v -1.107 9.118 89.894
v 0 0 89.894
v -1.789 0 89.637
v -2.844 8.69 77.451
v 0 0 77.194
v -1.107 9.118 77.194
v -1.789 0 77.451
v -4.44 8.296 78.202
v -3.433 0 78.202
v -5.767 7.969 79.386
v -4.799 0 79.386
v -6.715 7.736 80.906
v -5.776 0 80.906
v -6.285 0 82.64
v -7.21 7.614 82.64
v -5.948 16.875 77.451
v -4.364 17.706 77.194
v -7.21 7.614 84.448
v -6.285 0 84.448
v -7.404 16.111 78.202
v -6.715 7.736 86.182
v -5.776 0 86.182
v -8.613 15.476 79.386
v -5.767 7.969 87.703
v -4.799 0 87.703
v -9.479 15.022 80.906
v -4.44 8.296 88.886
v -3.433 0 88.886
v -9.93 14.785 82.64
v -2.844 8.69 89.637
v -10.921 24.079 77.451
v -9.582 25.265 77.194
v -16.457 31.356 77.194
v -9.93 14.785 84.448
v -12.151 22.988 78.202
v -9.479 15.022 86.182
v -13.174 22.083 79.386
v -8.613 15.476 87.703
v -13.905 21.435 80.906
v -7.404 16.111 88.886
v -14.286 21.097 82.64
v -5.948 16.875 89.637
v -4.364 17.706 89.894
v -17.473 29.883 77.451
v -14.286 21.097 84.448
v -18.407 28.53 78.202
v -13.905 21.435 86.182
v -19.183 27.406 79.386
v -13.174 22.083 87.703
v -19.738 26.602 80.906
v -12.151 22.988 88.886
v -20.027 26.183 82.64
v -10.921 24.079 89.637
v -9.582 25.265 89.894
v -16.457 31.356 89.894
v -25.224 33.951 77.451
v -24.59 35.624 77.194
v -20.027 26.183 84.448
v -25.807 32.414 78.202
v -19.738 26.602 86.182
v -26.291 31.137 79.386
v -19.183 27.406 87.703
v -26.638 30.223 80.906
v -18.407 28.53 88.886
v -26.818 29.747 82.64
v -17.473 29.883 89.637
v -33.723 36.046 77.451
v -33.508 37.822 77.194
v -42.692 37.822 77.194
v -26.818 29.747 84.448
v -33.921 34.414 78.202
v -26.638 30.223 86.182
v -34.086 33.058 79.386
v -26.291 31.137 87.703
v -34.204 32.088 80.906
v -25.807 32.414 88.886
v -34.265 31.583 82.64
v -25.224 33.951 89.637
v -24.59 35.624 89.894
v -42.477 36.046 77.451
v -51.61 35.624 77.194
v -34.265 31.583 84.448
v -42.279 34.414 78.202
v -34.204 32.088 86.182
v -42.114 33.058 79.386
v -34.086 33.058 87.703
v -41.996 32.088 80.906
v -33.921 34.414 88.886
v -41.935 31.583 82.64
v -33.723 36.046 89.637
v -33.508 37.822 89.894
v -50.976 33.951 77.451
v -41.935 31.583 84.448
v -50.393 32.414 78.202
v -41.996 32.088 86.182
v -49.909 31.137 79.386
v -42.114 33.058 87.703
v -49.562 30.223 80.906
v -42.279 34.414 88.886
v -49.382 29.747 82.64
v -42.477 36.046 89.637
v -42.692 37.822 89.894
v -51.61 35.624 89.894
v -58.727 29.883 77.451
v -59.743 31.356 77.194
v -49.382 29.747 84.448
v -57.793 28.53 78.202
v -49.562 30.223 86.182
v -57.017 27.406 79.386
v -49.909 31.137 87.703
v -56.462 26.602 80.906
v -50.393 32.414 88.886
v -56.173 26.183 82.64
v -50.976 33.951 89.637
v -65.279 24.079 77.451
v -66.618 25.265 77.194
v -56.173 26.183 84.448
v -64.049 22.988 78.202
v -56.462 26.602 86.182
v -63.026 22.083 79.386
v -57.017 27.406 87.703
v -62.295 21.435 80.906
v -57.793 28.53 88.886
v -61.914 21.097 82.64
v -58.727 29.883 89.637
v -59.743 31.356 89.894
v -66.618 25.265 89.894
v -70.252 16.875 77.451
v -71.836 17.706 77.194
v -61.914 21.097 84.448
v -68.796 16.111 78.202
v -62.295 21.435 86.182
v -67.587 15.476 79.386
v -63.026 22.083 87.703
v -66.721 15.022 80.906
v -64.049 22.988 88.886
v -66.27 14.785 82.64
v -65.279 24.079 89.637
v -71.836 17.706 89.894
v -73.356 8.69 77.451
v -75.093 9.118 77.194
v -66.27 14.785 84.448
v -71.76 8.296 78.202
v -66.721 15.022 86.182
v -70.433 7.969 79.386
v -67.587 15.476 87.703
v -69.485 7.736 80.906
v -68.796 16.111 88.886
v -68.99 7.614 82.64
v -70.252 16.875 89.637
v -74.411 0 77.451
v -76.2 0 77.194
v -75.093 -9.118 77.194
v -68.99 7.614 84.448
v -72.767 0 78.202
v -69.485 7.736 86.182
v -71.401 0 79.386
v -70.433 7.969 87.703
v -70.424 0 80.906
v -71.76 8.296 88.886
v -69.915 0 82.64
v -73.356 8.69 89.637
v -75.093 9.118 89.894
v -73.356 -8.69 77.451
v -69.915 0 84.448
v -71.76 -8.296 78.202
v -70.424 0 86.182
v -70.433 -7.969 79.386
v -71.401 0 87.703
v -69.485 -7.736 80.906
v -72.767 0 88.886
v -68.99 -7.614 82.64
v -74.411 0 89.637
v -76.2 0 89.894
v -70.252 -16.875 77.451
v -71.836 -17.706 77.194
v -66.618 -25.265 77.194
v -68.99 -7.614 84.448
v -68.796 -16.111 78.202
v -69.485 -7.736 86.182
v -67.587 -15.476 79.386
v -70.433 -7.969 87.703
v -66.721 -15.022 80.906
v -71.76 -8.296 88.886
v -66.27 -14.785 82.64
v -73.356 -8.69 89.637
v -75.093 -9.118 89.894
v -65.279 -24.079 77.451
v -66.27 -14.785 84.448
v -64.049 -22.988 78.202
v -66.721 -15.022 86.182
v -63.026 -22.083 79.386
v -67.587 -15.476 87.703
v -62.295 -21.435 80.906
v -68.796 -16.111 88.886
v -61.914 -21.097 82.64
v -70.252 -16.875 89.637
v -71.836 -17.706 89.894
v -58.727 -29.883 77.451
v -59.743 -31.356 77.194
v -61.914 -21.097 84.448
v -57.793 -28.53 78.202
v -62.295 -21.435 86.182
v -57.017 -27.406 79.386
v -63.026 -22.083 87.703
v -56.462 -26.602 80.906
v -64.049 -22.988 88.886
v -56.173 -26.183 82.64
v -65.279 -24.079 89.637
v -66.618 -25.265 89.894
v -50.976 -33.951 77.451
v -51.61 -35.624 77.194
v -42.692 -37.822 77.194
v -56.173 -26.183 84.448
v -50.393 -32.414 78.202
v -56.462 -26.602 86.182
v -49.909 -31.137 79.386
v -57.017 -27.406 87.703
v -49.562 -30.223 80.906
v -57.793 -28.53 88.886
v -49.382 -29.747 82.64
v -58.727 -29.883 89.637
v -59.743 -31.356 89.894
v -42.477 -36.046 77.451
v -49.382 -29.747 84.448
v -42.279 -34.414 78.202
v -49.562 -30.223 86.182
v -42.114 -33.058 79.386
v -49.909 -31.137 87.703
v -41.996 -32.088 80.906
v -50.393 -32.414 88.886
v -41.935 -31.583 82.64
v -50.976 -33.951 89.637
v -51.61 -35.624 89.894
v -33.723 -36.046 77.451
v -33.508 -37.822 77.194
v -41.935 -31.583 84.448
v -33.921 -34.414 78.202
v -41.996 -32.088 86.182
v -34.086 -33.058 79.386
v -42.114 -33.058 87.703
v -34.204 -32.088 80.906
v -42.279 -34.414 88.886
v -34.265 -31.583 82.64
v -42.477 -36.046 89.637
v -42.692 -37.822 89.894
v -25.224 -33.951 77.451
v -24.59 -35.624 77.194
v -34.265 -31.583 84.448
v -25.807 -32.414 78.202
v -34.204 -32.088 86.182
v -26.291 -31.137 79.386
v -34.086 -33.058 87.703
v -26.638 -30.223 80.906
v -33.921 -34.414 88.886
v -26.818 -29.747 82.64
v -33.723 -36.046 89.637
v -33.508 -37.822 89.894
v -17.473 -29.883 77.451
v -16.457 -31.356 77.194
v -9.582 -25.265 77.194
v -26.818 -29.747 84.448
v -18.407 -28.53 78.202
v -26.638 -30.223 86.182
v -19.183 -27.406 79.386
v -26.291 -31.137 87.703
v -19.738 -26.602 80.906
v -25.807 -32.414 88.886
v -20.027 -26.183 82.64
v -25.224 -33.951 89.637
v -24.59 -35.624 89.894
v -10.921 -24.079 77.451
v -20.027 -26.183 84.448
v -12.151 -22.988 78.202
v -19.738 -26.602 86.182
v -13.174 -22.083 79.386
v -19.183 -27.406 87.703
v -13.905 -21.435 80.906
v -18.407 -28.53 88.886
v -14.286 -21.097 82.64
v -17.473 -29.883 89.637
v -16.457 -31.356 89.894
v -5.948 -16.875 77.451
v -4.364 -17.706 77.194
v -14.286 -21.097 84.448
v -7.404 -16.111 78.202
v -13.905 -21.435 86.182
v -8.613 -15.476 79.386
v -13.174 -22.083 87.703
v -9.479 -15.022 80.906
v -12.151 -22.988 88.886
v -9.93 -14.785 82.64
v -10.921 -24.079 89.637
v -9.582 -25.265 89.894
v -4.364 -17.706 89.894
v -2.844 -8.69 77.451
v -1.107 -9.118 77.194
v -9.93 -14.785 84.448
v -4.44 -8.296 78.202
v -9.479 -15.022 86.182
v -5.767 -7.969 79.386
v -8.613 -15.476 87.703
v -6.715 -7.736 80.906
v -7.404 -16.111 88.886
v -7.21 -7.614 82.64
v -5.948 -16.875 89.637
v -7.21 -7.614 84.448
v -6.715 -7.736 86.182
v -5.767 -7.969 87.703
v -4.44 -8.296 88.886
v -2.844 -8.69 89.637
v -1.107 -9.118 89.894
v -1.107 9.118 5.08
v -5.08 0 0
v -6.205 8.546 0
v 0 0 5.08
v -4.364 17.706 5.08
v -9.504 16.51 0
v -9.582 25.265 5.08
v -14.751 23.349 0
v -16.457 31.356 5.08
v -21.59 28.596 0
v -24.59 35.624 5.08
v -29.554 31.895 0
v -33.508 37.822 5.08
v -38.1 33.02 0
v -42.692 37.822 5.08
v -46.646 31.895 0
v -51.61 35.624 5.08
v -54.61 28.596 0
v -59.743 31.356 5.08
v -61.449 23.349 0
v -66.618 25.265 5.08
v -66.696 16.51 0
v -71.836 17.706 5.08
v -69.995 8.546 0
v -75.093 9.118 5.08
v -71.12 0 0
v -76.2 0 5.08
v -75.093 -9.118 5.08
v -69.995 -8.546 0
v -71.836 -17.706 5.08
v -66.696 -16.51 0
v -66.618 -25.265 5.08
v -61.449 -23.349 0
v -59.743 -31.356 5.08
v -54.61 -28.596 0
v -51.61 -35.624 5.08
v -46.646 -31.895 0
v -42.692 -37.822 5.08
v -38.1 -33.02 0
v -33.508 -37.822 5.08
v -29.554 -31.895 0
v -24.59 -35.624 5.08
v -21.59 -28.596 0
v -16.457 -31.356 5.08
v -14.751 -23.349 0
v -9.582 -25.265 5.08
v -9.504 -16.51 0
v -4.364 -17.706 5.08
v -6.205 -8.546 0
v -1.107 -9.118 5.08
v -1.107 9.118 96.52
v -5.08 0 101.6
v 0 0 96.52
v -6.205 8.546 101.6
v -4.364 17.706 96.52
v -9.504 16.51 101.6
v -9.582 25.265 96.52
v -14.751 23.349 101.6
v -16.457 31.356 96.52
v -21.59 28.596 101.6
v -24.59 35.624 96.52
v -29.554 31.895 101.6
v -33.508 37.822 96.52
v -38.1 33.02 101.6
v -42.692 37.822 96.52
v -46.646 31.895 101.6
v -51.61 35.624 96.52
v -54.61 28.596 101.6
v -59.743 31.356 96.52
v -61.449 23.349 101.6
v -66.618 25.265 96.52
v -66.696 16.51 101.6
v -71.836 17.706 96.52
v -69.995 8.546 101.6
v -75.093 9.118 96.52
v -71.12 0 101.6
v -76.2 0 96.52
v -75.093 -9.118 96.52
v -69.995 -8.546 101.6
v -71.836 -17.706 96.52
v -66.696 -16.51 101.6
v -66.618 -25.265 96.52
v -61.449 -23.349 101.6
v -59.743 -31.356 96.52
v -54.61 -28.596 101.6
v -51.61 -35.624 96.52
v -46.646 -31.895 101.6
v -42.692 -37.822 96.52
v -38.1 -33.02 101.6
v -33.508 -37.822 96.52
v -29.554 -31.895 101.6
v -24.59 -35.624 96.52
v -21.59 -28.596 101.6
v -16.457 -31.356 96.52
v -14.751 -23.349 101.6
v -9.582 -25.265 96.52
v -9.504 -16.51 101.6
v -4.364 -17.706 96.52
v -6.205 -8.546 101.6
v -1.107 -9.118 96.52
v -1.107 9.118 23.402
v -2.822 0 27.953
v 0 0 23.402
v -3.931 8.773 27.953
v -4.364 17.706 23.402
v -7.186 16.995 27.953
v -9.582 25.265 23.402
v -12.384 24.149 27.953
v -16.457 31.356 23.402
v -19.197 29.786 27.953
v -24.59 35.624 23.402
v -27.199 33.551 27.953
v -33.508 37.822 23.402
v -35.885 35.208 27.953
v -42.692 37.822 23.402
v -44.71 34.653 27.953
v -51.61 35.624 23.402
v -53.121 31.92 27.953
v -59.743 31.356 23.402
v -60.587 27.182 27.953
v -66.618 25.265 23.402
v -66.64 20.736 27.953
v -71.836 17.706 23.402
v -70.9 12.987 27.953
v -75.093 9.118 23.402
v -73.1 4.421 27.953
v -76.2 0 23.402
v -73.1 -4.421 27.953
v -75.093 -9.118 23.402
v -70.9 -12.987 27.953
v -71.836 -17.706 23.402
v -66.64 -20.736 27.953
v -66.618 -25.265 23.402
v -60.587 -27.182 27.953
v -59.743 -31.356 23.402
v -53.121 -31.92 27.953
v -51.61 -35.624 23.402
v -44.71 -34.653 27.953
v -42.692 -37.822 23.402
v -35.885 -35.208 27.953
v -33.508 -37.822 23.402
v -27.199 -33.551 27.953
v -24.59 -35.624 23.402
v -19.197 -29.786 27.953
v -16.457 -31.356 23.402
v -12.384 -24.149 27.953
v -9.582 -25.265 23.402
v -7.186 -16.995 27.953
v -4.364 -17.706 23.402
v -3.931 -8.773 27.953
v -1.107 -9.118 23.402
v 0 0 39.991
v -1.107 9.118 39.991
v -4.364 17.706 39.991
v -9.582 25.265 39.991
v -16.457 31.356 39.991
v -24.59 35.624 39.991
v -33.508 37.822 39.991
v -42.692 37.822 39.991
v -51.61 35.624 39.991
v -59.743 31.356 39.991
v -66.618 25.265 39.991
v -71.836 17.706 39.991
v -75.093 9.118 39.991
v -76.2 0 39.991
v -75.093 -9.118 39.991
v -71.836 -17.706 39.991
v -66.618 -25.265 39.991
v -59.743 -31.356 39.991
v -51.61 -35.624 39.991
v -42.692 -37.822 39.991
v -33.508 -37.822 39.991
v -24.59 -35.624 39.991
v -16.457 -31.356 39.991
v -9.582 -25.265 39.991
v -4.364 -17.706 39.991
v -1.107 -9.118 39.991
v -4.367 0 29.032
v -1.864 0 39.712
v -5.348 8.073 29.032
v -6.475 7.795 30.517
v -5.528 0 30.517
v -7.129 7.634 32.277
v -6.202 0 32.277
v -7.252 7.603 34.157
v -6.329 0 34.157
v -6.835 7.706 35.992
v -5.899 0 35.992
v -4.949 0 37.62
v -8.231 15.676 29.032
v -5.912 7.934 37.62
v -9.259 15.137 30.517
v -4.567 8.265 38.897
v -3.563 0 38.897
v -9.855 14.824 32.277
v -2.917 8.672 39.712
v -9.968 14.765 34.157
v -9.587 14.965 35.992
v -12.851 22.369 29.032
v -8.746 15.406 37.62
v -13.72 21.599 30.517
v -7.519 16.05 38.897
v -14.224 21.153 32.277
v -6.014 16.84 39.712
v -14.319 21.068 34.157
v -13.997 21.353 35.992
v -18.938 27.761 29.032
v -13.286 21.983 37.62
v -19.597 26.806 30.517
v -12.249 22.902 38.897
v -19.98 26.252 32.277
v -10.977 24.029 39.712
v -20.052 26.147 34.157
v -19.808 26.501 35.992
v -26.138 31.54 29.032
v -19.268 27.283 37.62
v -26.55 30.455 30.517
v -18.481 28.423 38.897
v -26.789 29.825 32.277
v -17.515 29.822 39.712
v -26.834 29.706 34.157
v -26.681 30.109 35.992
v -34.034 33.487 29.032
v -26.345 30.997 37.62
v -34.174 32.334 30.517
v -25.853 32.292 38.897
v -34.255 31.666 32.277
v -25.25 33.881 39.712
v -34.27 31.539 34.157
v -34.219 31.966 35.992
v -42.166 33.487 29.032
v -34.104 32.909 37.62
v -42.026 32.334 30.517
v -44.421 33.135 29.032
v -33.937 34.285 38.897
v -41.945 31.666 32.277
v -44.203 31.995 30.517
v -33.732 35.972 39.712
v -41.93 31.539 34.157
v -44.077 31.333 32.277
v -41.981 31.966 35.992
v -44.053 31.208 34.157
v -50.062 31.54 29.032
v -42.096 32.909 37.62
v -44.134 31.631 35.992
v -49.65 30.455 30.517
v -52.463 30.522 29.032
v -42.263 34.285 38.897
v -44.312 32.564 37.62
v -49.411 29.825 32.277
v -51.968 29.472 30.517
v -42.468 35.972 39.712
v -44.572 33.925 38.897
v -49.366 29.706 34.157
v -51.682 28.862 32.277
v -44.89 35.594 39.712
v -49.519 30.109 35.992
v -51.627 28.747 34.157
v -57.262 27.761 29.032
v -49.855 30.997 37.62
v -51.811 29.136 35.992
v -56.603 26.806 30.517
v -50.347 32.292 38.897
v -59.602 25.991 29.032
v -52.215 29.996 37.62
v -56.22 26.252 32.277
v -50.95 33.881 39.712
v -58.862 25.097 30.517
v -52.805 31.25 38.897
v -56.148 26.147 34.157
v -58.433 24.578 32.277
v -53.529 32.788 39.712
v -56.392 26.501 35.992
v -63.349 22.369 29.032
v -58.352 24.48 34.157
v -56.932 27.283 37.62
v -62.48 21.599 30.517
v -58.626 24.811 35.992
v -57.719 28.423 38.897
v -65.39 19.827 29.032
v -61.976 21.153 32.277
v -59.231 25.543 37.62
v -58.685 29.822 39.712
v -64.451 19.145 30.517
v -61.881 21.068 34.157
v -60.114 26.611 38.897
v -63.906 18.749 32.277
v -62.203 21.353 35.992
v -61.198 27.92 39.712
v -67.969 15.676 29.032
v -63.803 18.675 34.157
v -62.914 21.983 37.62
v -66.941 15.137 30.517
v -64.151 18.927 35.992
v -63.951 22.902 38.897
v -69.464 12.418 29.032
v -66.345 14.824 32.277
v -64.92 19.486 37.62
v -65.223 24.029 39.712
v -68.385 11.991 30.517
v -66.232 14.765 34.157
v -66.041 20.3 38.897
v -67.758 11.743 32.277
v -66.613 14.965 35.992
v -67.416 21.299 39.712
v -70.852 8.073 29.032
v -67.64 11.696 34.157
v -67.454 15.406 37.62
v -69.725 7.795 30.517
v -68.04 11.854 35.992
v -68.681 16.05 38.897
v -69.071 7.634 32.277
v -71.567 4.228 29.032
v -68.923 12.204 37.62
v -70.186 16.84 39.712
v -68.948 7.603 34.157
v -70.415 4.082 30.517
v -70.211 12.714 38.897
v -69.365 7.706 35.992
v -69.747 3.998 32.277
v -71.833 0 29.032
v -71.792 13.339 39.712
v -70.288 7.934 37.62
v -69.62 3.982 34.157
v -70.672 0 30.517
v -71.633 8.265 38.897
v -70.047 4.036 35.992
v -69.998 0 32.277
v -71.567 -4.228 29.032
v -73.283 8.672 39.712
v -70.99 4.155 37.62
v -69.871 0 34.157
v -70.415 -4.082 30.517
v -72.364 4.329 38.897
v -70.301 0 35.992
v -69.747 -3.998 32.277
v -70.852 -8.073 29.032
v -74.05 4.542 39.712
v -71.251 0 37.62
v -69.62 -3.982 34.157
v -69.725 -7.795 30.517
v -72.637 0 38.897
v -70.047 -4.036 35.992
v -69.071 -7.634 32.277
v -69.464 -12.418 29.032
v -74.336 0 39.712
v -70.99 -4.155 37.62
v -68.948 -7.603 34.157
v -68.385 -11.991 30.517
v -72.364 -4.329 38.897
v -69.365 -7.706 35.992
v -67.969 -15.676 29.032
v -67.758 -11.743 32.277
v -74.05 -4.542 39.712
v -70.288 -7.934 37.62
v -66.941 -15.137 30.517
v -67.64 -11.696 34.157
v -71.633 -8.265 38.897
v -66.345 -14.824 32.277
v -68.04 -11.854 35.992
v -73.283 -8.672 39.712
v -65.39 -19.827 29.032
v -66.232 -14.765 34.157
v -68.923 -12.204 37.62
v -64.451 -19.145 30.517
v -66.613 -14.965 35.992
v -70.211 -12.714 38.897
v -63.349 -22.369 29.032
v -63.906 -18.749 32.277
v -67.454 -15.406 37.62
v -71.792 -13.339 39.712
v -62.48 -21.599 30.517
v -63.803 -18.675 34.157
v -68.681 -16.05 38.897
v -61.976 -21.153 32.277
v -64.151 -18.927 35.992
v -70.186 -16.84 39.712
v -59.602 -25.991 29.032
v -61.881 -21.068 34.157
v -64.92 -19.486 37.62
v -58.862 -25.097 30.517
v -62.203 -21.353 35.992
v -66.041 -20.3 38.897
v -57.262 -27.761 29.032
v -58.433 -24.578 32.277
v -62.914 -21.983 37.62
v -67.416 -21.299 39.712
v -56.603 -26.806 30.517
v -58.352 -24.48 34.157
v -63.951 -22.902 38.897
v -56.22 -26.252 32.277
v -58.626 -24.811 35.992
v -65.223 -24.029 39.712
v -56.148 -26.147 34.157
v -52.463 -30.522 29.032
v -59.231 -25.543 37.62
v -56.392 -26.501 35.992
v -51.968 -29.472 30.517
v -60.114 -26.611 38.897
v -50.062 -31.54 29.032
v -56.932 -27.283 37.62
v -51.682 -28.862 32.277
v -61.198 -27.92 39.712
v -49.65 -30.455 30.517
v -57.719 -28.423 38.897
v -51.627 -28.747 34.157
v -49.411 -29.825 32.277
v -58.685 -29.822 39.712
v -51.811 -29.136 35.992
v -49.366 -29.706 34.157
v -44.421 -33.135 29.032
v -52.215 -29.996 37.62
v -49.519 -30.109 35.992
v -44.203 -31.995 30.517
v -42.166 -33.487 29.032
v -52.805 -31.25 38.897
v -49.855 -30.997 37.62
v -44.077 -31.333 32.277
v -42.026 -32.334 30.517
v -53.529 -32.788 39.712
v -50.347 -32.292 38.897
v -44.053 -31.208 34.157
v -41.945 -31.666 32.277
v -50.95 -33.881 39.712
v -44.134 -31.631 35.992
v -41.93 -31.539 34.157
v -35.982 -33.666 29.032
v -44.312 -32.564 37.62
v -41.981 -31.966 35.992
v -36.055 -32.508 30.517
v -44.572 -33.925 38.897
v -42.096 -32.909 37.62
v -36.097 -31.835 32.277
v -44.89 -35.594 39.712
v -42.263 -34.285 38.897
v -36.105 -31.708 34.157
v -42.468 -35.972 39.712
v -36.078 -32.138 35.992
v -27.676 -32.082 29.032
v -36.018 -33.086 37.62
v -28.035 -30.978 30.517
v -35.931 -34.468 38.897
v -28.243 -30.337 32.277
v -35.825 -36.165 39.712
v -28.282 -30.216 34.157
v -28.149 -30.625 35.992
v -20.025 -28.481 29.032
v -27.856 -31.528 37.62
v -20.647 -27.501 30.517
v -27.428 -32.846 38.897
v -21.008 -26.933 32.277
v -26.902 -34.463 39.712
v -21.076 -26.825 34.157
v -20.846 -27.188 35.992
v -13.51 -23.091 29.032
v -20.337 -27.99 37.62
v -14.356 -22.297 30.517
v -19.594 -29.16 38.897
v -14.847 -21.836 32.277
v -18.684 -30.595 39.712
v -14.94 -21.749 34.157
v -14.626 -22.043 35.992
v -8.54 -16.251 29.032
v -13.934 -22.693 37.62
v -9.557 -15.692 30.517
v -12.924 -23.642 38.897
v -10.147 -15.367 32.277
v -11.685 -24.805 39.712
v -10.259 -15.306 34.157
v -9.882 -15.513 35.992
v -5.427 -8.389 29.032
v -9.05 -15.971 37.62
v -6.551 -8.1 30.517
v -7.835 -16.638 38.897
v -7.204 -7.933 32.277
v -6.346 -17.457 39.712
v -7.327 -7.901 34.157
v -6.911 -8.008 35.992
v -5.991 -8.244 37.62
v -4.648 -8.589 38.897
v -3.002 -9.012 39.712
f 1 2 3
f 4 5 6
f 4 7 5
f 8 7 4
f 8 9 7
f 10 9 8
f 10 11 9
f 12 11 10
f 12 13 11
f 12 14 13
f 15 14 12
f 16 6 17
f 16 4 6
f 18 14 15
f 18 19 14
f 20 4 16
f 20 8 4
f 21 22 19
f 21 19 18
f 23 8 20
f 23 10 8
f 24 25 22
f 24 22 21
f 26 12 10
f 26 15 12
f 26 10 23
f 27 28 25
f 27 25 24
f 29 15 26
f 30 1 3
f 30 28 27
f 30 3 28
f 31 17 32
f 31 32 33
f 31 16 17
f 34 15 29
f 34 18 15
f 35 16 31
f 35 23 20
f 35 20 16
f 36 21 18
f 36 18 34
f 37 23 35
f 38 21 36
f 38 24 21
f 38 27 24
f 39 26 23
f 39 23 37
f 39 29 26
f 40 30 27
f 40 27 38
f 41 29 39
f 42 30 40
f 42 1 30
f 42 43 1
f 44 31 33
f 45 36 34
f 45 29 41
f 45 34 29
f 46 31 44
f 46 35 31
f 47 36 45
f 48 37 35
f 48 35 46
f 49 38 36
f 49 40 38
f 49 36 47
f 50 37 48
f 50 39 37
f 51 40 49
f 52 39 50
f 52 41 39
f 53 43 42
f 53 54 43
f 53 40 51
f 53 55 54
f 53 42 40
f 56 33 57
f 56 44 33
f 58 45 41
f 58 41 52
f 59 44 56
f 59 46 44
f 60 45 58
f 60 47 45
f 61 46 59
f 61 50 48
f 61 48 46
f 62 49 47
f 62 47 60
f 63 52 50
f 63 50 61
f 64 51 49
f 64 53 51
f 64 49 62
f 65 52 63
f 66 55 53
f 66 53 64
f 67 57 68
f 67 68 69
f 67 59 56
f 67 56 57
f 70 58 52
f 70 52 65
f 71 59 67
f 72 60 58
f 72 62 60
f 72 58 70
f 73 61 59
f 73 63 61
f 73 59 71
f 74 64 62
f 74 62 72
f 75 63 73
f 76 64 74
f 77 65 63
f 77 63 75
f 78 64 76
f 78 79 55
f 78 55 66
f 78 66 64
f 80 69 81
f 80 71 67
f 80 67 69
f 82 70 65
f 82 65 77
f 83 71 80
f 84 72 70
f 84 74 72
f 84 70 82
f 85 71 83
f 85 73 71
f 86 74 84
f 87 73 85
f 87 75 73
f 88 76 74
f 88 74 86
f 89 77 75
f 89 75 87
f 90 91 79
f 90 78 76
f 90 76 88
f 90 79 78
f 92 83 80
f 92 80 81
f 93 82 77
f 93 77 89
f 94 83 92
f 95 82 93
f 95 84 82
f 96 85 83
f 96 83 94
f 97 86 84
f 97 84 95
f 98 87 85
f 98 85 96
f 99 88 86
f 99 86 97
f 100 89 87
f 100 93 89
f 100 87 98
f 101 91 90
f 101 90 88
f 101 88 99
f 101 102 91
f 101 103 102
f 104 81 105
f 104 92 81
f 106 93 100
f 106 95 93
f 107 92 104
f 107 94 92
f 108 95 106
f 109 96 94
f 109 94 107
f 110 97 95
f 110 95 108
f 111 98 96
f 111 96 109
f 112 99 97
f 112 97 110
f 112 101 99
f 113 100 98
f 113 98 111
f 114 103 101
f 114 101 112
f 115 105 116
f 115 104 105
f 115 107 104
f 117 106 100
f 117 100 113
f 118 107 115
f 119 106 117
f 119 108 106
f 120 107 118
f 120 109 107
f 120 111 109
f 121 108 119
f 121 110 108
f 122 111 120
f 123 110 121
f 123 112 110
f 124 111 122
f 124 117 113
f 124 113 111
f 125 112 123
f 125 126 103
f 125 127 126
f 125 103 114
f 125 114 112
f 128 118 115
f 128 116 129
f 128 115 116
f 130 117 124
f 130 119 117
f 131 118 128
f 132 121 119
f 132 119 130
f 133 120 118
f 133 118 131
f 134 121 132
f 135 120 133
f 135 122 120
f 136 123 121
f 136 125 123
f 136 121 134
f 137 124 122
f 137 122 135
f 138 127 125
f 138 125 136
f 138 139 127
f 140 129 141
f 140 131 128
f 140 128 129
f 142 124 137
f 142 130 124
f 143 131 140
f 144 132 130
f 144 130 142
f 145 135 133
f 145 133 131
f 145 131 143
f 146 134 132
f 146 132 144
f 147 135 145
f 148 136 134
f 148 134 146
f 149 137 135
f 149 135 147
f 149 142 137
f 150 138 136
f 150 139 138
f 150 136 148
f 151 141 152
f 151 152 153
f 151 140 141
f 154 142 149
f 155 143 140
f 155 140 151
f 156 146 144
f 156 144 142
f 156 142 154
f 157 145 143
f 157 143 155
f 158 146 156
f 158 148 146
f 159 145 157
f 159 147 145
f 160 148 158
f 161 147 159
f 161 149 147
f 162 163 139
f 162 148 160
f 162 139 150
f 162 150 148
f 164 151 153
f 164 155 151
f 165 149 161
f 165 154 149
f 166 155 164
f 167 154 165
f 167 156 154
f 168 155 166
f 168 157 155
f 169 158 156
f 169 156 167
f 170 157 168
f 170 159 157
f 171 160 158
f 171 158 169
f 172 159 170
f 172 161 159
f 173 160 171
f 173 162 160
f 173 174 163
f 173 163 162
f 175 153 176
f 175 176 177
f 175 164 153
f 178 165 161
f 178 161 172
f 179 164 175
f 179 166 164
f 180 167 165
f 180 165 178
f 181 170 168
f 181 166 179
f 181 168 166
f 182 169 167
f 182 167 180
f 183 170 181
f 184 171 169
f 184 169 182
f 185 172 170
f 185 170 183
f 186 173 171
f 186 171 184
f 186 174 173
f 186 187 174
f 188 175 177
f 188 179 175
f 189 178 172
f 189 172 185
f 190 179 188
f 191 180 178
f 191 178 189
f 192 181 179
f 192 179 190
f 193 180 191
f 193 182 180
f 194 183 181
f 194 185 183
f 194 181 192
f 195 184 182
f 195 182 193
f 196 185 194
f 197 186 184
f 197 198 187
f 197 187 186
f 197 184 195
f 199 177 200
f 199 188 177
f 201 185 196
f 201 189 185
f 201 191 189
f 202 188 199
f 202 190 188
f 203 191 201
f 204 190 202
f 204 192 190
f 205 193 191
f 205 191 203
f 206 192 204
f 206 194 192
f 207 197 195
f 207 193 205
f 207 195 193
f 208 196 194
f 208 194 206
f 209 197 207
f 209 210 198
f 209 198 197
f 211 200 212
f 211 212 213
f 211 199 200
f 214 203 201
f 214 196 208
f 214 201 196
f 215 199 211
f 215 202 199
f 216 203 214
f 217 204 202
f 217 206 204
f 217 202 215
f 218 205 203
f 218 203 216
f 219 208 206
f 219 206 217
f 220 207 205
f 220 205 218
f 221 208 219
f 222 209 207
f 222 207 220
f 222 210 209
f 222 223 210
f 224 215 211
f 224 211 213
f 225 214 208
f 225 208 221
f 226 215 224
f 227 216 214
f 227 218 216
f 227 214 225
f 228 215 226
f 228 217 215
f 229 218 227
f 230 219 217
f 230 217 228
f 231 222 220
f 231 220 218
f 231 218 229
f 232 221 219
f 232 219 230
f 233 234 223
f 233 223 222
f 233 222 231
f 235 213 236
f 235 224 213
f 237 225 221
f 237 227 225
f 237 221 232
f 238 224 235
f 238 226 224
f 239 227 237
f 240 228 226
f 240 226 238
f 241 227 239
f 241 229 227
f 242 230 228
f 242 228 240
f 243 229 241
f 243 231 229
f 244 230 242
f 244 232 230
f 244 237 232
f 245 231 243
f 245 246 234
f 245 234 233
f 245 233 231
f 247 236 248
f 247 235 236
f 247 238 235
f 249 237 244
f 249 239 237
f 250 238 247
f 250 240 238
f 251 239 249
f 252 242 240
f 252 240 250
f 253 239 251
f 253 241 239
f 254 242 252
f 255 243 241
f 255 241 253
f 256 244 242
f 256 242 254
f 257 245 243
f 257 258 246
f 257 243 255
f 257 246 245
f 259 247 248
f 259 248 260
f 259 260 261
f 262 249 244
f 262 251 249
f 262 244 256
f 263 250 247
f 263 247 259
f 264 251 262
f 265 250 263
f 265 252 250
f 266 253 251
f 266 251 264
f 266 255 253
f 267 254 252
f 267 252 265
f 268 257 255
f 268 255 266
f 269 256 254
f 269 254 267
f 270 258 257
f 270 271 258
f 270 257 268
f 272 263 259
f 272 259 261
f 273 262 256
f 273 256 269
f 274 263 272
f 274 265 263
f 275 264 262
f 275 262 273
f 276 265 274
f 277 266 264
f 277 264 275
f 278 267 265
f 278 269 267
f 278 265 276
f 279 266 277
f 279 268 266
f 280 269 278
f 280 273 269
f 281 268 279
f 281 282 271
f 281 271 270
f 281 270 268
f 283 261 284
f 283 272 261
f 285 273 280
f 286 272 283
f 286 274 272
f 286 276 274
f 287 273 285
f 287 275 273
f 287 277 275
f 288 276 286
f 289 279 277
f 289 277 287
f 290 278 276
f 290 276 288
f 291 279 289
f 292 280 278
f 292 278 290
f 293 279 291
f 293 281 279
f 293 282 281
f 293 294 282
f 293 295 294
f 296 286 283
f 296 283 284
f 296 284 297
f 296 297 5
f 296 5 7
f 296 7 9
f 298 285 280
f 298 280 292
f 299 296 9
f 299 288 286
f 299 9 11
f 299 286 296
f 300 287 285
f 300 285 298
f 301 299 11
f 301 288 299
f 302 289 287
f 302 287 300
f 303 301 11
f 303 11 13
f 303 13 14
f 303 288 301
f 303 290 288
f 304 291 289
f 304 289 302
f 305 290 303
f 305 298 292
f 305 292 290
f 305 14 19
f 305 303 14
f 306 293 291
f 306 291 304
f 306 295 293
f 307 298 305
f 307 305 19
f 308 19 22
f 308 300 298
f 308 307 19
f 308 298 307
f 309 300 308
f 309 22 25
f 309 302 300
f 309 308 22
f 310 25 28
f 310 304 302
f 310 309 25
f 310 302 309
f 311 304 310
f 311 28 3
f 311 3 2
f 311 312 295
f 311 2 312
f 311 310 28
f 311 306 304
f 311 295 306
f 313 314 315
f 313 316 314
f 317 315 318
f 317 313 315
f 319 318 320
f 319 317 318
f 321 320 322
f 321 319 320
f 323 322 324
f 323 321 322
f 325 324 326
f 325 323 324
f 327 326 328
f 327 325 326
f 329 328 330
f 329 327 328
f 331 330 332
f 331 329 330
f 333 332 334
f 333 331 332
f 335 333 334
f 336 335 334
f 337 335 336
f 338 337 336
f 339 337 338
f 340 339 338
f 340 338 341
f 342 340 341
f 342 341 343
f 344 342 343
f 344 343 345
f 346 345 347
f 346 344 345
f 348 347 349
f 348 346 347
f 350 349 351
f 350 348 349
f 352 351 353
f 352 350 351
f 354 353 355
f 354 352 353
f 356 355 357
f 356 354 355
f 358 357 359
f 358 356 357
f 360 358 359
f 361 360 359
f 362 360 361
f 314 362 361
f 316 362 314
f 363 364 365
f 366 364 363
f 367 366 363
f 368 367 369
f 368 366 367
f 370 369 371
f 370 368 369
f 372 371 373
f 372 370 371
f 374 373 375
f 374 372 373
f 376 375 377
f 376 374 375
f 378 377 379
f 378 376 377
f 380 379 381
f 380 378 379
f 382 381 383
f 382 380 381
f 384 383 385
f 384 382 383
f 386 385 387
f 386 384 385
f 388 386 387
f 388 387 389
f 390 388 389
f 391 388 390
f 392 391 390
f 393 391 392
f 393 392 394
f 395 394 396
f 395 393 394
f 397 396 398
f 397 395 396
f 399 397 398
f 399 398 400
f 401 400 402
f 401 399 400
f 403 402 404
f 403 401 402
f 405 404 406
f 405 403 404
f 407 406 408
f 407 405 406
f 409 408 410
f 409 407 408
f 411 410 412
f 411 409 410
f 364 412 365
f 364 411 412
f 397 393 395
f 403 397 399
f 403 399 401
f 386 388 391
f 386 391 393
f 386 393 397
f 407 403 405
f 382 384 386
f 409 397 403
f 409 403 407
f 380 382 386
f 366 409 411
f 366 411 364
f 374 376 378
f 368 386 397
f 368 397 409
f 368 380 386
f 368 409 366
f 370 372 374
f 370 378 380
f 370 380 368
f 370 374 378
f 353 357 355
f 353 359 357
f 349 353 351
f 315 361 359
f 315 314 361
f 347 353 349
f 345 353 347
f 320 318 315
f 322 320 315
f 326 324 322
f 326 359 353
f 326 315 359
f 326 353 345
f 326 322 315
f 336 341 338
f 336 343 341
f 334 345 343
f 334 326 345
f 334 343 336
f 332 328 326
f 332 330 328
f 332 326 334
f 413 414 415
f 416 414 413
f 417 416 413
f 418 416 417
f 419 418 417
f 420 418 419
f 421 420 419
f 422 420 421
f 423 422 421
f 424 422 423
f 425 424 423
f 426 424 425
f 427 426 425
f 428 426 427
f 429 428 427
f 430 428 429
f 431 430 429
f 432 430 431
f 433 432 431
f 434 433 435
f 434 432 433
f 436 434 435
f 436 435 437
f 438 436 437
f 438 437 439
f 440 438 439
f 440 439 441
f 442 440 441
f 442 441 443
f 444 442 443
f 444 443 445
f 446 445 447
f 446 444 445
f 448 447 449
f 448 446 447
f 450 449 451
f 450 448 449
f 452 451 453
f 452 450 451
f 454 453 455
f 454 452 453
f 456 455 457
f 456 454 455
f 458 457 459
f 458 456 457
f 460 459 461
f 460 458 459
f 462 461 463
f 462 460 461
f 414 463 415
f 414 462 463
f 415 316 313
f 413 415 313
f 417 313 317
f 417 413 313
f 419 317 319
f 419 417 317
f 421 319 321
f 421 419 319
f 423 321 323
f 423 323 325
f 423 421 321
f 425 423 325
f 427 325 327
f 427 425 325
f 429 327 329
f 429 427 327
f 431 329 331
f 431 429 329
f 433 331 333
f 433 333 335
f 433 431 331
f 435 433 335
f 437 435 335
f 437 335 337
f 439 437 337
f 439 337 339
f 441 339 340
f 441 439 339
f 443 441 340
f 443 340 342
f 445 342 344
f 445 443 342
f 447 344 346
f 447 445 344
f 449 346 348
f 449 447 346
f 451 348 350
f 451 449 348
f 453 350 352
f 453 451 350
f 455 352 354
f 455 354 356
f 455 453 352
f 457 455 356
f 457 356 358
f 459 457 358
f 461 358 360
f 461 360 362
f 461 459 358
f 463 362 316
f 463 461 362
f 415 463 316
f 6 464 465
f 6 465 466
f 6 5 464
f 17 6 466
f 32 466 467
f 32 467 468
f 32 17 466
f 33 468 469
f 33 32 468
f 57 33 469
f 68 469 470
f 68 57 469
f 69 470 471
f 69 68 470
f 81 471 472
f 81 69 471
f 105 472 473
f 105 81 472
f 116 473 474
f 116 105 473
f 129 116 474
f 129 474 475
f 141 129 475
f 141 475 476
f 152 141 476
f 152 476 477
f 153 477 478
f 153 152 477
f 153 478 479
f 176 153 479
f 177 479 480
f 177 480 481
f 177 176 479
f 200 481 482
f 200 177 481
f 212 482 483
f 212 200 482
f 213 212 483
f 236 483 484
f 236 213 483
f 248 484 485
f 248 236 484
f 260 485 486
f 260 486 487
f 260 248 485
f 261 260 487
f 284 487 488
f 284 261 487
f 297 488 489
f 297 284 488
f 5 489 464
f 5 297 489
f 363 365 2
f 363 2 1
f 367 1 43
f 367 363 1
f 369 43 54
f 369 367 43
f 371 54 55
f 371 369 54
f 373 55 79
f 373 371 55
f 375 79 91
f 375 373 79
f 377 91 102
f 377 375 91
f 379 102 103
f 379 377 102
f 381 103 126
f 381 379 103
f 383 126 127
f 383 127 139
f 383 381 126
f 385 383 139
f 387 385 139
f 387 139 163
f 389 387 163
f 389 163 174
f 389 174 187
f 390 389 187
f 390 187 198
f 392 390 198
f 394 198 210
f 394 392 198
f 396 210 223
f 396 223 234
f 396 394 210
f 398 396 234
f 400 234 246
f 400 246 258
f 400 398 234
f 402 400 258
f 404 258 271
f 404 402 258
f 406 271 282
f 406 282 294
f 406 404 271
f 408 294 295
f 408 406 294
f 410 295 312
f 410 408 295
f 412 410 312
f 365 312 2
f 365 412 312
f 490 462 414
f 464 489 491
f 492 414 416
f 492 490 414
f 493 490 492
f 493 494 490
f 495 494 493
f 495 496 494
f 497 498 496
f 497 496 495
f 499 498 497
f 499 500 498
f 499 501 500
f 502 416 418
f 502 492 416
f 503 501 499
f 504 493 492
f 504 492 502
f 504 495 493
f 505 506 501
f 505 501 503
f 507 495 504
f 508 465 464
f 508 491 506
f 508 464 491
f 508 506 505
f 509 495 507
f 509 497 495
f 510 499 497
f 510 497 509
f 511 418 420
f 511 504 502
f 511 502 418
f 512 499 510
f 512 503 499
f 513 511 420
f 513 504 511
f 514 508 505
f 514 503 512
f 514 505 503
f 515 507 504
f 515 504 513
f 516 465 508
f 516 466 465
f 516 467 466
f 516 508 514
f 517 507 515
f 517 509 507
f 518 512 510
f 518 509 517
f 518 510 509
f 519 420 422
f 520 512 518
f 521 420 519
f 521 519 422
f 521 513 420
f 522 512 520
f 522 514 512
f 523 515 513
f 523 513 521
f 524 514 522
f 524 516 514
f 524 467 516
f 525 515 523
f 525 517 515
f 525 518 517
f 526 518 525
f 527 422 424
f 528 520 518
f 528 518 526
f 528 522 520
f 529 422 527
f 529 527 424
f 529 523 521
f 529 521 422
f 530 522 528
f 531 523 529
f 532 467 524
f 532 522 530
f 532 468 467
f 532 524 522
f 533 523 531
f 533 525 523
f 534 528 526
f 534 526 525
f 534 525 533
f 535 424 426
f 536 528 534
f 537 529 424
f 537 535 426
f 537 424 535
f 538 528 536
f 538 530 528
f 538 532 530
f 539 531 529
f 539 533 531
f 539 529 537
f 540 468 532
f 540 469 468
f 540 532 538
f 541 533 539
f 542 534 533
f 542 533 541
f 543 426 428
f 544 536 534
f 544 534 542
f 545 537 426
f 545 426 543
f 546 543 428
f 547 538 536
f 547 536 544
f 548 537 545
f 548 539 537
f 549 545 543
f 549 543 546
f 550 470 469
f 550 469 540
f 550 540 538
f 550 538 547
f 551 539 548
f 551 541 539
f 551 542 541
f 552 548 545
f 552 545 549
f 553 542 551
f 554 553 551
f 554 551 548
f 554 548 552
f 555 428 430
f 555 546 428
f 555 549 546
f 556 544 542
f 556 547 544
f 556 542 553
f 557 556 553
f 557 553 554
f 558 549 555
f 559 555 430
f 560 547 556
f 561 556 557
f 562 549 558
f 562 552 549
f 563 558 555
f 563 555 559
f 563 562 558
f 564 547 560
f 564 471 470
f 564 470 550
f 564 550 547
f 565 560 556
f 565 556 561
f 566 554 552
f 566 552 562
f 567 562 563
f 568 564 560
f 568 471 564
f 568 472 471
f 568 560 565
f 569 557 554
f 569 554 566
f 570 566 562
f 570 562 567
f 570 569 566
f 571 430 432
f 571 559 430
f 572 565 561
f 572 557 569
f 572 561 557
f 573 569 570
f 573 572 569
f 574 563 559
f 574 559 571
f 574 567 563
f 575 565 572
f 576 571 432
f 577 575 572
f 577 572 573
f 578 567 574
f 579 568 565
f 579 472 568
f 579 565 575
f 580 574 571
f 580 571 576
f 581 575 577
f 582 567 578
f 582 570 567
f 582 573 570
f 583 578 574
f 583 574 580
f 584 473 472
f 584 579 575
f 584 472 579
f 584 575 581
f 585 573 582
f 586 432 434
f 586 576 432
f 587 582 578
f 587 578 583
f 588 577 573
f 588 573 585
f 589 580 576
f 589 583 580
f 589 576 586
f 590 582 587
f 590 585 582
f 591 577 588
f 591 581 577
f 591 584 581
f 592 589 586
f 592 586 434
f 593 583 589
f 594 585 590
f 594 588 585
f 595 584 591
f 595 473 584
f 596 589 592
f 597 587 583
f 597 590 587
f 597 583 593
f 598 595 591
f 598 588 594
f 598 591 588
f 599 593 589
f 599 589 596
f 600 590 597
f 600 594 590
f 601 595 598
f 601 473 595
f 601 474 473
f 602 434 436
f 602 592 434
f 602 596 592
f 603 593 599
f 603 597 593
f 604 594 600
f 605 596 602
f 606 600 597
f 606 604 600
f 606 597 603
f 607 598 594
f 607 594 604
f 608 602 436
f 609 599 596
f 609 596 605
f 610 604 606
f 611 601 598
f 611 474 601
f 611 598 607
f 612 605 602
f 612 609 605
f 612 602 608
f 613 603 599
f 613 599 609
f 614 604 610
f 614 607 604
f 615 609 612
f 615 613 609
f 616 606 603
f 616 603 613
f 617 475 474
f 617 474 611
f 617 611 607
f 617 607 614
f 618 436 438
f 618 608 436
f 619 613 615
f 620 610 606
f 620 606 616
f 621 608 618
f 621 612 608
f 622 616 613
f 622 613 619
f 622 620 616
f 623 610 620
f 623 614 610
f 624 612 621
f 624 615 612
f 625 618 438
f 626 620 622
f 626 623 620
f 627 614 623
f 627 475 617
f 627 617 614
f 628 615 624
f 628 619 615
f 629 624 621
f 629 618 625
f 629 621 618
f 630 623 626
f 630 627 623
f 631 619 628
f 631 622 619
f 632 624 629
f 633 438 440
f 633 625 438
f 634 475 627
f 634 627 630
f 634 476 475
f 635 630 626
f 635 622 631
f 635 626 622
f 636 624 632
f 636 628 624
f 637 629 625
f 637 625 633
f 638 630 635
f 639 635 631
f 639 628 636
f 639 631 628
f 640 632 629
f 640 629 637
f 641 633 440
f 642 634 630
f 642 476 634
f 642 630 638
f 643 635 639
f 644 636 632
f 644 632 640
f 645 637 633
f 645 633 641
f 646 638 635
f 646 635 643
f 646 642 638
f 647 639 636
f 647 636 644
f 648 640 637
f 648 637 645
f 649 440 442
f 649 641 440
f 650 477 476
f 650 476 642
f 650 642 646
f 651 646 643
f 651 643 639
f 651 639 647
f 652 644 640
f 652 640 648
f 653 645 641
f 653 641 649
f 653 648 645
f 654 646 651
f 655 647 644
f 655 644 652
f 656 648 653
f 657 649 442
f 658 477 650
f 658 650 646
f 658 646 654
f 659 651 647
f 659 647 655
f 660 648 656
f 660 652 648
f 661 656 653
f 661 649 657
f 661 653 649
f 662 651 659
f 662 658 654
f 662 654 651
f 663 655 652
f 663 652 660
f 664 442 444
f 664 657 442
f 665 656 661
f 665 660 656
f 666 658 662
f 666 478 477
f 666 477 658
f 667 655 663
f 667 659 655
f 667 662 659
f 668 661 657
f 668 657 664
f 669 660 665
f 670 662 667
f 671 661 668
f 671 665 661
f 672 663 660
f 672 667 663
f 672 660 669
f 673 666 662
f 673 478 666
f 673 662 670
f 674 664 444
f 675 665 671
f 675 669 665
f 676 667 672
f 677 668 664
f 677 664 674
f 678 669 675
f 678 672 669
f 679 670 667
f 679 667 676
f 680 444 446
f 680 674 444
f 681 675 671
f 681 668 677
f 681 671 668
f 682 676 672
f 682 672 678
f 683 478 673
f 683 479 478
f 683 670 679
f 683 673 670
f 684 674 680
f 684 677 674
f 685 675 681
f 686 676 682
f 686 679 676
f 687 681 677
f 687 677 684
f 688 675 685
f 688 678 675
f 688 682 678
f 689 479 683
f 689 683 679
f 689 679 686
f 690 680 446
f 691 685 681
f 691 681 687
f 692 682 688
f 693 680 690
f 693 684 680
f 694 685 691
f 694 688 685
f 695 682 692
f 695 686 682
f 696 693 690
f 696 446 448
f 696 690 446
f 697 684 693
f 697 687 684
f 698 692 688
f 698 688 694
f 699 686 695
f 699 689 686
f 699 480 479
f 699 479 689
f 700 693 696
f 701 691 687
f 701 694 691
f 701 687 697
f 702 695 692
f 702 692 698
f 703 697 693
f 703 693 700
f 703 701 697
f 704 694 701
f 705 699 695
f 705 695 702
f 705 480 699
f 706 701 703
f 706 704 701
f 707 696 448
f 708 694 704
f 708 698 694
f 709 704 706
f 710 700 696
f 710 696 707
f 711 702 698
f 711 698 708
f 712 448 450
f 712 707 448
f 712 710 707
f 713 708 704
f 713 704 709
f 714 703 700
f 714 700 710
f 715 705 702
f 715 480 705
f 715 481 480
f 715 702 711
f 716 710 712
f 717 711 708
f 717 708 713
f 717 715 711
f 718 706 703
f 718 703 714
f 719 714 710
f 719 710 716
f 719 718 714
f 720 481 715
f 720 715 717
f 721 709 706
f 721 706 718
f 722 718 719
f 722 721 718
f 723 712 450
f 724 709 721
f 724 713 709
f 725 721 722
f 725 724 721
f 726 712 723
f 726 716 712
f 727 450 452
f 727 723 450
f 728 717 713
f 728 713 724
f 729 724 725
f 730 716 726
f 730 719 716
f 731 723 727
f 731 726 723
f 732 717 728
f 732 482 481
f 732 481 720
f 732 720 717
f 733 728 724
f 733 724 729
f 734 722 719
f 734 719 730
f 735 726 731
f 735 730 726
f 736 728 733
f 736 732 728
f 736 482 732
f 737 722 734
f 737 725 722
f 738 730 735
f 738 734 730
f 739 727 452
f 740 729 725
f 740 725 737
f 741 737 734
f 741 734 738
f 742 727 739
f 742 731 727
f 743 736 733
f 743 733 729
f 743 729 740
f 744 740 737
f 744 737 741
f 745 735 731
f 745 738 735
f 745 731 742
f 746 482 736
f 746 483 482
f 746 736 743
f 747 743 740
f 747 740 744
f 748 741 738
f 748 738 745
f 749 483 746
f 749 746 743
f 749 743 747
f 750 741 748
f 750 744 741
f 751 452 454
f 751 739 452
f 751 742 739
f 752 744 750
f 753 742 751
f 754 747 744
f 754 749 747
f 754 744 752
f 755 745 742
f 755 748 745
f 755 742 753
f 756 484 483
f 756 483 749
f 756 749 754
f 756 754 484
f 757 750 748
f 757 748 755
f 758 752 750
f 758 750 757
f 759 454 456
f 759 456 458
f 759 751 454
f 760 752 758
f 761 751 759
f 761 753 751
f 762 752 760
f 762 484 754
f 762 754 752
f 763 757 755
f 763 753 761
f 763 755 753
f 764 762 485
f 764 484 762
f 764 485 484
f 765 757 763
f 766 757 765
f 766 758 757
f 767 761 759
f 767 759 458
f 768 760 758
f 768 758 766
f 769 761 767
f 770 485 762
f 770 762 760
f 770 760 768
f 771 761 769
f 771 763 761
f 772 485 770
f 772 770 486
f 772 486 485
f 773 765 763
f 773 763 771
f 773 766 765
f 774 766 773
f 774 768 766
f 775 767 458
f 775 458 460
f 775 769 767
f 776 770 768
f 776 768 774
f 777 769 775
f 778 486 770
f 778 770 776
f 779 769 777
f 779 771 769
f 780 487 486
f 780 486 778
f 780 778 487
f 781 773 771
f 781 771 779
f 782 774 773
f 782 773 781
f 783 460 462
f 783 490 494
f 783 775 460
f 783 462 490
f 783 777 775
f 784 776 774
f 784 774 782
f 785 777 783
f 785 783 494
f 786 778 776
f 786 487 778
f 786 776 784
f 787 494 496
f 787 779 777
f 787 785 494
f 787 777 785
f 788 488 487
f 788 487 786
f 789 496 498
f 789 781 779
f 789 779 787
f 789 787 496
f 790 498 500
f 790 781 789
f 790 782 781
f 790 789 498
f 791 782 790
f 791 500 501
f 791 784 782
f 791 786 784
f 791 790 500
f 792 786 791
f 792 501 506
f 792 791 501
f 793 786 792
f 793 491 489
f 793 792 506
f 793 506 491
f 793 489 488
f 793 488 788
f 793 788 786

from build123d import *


# Not quite as in the source:
# - a fillet or chamfer that OpenCascade refuses, or shapes differently, is made with other operations: its cross-section is extruded or revolved along the edge and cut away or added


with BuildPart() as f1:
    # F0 (on Front) → F1 (revolve)
    with BuildSketch(Plane.XZ):
        with BuildLine():
            Line((-38.1, 0), (0, 0))
            Line((0, 0), (0, 27.2913607001))
            ThreePointArc((0, 27.2913607001), (-6.35, 33.6413607001), (0, 39.9913607001))
            Line((0, 39.9913607001), (0, 77.1941723466))
            ThreePointArc((0, 77.1941723466), (-6.35, 83.5441723466), (0, 89.8941723466))
            Line((0, 89.8941723466), (0, 101.6))
            Line((0, 101.6), (-38.1, 101.6))
            Line((-38.1, 101.6), (-38.1, 0))
        make_face()
    revolve(axis=Axis((-38.1, 0, 50.8), (0, 0, 1)))

    # F2: chamfer of 5.08 on 4 edges, made by hand

    # F2_s1 → F2_t2 (revolve, cut)
    with BuildSketch(Plane.XZ):
        Polygon((0, 96.52), (-5.08, 101.6), (0, 101.6), align=None)
    revolve(axis=Axis((-38.1, 0, 101.6), (0, 0, 1)), mode=Mode.SUBTRACT)

    # F2_s3 → F2_t4 (revolve, cut)
    with BuildSketch(Plane.XZ):
        Polygon((-5.08, 0), (0, 5.08), (0, 0), align=None)
    revolve(axis=Axis((-38.1, 0, 0), (0, 0, 1)), mode=Mode.SUBTRACT)

    # F2_s5 → F2_t6 (revolve, cut)
    with BuildSketch(Plane.XZ):
        with BuildLine():
            Line((0, 23.4022933598), (-2.8222222222, 27.9529899555))
            ThreePointArc((-2.8222222222, 27.9529899555), (-1.5219513398, 27.4764467413), (0, 27.2913607001))
            Line((0, 27.2913607001), (0, 23.4022933598))
        make_face()
    revolve(axis=Axis((-38.1, 0, 27.2913607001), (0, 0, 1)), mode=Mode.SUBTRACT)


solid = f1.part
